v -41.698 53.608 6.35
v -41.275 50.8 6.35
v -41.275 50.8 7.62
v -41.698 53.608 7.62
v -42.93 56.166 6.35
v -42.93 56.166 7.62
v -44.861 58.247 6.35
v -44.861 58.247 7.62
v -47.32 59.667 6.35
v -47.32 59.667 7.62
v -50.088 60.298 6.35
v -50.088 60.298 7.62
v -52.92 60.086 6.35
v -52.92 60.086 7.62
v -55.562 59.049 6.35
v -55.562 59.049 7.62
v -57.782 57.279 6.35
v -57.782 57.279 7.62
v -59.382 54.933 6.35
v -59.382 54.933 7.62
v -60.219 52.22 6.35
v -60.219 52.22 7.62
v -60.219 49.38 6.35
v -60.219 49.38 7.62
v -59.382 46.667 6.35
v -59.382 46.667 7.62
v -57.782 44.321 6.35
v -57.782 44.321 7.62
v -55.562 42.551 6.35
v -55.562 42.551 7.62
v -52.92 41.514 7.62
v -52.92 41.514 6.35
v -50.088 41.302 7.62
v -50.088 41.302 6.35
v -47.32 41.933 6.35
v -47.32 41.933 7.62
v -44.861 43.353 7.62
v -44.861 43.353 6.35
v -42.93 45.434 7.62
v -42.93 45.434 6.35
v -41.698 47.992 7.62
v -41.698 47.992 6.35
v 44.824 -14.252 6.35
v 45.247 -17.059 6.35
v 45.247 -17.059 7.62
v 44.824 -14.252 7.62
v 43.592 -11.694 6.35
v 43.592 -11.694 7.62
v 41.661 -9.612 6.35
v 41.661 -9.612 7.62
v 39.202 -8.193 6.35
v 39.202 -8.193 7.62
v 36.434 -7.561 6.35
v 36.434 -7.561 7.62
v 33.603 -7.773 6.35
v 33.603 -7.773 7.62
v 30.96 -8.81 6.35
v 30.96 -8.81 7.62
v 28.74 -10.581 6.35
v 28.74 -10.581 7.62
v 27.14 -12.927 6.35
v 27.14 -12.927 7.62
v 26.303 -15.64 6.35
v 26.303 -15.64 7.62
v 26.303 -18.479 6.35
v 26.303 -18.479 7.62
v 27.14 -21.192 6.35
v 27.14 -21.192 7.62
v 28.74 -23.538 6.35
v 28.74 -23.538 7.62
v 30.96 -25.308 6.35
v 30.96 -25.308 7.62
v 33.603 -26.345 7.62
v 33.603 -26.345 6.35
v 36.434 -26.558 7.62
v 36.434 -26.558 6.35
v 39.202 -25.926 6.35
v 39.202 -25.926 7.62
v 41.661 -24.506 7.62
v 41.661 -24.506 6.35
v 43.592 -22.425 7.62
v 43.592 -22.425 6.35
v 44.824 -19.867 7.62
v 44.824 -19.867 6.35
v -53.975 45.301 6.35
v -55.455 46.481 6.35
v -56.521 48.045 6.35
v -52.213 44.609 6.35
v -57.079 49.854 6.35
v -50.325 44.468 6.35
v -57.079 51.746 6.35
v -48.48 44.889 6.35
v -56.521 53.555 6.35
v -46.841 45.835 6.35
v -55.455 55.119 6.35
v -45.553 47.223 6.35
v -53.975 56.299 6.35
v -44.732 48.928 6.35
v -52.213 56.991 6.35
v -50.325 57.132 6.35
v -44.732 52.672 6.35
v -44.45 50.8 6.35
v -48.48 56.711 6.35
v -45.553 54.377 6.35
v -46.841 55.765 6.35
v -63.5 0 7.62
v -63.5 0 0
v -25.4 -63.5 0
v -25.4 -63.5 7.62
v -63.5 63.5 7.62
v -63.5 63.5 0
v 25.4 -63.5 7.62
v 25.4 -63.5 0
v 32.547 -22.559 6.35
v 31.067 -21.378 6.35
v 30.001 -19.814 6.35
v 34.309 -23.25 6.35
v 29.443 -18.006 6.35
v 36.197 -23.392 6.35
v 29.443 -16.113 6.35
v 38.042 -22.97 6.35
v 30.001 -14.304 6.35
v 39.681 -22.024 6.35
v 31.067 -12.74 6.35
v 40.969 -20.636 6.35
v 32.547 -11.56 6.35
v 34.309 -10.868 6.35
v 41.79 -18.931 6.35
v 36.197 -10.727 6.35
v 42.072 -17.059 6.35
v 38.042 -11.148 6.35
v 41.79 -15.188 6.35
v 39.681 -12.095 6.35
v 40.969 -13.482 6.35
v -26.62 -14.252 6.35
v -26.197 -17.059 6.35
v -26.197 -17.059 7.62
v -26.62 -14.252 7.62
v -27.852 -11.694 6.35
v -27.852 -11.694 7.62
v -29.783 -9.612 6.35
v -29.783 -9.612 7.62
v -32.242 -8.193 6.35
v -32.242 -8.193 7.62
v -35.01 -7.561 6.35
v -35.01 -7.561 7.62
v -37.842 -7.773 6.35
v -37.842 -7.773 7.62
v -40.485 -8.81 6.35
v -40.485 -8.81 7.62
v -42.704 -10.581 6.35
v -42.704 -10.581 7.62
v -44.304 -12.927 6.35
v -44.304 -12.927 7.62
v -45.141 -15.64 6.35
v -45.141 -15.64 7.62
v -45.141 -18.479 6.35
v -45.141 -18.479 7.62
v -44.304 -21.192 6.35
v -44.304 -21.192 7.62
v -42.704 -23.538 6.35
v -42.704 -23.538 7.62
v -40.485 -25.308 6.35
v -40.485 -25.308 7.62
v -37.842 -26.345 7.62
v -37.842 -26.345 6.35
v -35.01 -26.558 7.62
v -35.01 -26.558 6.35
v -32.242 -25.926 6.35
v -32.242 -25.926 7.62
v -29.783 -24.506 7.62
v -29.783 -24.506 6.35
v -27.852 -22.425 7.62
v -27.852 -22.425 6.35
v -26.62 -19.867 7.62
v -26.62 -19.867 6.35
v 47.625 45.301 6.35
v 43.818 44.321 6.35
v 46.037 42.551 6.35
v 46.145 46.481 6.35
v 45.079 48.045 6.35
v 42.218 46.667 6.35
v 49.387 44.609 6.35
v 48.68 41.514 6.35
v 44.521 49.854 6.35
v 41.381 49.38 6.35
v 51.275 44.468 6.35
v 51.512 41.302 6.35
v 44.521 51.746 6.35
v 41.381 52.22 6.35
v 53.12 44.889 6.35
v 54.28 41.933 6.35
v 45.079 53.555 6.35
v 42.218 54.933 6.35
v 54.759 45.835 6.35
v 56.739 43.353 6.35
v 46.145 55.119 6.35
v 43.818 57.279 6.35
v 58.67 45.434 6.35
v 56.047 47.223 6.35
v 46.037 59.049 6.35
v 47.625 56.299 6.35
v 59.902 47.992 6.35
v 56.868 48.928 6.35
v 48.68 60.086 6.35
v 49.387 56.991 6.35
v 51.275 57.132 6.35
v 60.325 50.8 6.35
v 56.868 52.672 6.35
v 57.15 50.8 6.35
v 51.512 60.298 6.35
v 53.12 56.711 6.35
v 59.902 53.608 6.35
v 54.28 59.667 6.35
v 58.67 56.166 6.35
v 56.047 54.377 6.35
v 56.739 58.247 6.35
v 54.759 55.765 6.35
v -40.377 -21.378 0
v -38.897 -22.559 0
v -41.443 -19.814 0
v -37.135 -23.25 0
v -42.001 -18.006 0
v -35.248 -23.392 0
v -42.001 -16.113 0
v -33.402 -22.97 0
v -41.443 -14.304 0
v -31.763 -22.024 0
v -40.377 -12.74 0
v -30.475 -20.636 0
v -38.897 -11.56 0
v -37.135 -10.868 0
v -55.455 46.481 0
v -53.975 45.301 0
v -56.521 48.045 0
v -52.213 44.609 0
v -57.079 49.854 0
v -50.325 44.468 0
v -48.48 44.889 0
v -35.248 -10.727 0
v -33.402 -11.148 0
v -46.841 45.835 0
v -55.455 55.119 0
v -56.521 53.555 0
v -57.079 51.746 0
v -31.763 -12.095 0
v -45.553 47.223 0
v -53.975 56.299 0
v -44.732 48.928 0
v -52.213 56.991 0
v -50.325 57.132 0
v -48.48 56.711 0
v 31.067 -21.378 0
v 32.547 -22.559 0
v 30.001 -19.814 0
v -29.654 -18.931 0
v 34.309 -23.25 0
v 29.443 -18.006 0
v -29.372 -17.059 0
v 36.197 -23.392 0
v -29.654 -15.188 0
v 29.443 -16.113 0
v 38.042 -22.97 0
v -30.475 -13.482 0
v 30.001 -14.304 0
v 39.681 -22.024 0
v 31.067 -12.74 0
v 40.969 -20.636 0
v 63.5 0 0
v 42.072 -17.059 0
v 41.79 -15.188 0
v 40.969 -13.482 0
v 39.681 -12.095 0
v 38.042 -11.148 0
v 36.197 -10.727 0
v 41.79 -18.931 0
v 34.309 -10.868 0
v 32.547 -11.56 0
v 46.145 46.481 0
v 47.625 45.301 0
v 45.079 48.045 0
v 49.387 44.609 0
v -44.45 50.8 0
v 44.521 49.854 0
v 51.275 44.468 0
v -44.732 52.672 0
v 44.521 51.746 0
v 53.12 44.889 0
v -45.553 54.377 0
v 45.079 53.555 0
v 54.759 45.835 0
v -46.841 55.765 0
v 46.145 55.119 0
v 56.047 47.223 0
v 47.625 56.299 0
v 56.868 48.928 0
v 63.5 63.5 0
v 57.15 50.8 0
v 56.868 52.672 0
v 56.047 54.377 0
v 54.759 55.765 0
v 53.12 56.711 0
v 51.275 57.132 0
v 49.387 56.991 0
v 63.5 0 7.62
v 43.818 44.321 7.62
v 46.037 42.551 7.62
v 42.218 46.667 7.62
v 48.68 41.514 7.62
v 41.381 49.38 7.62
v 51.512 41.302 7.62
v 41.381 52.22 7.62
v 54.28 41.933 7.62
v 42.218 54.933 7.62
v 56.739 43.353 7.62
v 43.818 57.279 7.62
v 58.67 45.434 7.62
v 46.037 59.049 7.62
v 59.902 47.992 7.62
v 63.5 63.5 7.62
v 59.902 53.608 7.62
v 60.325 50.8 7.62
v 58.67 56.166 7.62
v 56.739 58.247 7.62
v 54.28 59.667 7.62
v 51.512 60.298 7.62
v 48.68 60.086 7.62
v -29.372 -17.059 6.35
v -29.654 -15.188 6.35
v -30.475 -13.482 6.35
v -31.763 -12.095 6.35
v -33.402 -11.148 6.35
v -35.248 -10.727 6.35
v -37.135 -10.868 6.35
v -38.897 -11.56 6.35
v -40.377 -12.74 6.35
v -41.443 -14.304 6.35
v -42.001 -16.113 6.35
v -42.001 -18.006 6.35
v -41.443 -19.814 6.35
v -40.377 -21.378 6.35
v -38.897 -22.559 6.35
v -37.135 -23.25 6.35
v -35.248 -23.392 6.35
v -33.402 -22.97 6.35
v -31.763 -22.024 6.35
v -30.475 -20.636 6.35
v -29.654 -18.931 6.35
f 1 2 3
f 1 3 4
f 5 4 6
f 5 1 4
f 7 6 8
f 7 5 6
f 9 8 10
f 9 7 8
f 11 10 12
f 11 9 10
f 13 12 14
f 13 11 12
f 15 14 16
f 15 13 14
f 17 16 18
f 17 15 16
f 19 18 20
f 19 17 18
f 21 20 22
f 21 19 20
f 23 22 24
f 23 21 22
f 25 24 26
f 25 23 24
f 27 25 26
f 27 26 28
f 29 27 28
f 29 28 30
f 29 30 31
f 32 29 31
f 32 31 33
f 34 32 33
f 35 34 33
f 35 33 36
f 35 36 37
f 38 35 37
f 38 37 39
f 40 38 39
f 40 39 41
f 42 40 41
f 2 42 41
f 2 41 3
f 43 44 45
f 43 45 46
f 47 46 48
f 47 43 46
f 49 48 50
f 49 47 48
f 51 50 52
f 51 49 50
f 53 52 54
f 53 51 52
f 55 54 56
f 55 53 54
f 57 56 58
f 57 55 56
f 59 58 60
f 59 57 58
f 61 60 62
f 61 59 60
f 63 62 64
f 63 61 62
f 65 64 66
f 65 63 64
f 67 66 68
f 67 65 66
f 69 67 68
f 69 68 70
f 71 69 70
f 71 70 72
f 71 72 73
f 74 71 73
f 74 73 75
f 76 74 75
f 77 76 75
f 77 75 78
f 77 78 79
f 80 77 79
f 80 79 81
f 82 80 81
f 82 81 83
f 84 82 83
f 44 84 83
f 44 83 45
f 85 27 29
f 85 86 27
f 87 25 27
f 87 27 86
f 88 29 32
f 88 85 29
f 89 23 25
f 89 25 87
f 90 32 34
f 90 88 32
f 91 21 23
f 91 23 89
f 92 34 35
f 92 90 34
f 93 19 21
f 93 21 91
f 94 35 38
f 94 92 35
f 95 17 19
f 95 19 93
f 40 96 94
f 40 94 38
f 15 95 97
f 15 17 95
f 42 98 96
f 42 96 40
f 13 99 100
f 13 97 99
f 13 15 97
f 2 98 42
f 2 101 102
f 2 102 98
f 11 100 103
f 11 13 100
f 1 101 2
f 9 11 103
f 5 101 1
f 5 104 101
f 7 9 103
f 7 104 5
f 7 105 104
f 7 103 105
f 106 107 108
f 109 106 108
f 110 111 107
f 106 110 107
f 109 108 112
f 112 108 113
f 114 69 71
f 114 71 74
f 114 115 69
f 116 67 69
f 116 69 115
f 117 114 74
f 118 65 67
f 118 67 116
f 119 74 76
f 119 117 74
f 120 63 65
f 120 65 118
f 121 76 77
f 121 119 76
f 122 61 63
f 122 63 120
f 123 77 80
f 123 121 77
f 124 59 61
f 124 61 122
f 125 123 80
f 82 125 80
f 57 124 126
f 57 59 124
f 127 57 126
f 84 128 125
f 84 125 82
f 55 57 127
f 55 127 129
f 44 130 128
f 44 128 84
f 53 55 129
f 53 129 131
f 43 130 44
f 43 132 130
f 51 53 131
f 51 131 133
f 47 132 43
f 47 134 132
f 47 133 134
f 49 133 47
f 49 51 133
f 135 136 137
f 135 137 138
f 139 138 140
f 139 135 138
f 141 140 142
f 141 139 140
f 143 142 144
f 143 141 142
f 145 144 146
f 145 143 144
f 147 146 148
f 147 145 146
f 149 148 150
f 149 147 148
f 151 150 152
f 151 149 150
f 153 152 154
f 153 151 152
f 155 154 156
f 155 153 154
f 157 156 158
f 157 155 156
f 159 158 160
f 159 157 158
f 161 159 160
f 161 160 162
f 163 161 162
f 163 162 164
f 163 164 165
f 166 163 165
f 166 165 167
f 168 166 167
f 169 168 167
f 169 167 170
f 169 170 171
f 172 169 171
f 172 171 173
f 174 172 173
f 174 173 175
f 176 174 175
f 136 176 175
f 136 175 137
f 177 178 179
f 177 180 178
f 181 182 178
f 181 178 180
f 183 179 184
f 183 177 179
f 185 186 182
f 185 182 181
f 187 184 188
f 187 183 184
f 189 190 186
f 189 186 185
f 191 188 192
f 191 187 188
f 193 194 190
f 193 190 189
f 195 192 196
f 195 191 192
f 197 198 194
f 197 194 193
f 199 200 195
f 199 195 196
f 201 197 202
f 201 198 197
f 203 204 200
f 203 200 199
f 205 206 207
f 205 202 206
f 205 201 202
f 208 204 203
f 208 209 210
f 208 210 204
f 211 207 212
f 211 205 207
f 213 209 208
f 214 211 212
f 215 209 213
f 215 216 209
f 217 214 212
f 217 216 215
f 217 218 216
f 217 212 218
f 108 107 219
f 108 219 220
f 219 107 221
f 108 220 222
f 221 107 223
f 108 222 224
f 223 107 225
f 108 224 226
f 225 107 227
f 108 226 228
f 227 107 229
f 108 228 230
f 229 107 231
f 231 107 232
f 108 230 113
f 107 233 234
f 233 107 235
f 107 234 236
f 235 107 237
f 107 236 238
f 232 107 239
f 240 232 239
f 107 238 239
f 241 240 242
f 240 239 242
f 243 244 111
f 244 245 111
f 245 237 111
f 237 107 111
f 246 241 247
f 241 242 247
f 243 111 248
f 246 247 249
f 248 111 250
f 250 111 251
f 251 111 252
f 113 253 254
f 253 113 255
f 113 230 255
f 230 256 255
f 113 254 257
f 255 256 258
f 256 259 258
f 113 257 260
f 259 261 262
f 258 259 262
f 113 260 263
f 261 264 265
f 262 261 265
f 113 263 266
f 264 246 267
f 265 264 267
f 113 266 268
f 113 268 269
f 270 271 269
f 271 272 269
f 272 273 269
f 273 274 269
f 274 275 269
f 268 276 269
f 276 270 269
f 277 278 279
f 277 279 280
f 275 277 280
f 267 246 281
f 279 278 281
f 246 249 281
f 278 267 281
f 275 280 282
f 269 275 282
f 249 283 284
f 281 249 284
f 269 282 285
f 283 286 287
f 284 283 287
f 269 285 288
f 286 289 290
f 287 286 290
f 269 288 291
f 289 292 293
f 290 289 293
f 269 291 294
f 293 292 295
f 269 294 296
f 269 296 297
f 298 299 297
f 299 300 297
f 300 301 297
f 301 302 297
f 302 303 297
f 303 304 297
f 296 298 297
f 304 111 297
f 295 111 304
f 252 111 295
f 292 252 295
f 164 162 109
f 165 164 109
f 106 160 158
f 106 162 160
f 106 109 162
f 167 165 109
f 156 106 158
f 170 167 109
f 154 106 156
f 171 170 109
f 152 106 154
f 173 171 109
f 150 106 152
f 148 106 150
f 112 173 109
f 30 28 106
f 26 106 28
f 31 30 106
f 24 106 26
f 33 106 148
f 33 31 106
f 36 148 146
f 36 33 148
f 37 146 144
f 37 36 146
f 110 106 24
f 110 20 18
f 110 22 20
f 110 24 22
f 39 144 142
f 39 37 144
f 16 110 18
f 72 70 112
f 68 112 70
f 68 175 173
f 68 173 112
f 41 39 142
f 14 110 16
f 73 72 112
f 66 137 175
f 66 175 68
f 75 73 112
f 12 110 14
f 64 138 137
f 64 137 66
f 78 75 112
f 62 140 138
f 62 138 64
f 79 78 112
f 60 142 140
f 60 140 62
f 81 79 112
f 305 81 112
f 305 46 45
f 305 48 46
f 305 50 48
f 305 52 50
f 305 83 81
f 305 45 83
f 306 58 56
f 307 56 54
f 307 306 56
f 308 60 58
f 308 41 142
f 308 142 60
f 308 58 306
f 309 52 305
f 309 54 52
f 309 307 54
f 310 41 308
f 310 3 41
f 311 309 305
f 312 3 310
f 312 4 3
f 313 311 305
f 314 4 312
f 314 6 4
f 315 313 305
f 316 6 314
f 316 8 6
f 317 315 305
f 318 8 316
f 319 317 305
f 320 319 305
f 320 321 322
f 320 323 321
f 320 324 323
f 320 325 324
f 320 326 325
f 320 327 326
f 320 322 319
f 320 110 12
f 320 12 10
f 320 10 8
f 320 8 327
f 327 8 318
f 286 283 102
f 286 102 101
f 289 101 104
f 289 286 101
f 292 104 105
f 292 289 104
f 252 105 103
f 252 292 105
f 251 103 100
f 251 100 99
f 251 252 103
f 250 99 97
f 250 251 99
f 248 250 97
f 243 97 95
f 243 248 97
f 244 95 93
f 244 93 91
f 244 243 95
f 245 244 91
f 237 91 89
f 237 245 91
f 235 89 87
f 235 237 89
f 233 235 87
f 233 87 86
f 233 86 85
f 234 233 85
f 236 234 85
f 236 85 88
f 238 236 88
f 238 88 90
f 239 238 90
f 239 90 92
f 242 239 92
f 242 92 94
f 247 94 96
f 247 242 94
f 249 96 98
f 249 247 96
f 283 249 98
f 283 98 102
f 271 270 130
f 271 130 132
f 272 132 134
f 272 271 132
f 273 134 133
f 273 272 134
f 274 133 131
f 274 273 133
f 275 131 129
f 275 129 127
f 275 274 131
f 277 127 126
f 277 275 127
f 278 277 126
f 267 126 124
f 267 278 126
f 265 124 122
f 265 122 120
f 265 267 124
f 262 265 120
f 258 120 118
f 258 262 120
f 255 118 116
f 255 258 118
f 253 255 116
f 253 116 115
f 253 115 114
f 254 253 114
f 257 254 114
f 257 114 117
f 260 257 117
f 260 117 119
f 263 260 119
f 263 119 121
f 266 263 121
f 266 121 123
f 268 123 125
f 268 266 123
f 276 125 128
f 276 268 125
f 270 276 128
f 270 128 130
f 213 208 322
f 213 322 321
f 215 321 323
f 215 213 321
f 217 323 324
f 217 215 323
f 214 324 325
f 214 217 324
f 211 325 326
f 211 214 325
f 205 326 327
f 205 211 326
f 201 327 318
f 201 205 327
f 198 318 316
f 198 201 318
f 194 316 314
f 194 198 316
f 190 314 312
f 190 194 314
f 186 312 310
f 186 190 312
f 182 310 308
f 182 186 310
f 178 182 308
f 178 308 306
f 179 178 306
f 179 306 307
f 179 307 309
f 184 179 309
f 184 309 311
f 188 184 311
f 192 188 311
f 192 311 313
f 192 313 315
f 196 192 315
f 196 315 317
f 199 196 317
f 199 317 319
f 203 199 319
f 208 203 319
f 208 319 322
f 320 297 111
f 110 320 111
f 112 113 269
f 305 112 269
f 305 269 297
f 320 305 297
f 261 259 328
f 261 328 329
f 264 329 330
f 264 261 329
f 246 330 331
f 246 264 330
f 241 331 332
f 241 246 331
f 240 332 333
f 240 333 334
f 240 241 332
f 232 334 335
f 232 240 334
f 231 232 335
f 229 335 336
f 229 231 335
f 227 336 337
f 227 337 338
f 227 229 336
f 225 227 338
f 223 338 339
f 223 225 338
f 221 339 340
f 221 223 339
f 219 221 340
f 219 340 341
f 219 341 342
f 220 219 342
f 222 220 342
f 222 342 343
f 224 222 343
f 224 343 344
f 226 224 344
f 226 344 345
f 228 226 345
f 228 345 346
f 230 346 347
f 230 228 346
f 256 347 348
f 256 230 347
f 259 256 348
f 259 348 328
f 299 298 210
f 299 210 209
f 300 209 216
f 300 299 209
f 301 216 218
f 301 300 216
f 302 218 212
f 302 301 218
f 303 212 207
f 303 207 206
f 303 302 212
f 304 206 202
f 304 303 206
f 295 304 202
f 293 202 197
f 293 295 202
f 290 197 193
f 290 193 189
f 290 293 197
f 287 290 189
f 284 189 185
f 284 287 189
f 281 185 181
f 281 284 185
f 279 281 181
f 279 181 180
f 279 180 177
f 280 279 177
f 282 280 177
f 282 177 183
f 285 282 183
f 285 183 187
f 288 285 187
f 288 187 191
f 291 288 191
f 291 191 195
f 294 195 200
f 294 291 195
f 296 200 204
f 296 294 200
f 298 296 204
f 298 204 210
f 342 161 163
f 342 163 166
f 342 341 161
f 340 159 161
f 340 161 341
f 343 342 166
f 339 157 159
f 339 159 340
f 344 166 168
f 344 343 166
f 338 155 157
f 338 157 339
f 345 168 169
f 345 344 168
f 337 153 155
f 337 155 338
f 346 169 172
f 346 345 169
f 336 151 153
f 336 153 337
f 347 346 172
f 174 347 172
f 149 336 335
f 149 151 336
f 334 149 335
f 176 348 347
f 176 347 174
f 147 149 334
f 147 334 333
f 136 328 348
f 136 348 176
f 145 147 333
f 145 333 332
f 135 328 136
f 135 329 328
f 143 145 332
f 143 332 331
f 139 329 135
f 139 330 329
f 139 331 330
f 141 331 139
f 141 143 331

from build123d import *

# Parameters (mm, degrees)
F0_R     = 9.525
F2_DEPTH = 7.62
F0_R_2   = 6.35
F3_DEPTH = 6.35


with BuildPart() as f2:
    # F0 (on Top) → F2 (new body)
    with BuildSketch(Plane.XY):
        Polygon((-63.5, 0), (-25.4, -63.5), (25.4, -63.5), (63.5, 0), (63.5, 63.5), (-63.5, 63.5), align=None)
        with Locations((-35.722047, -17.059289)):
            Circle(F0_R, mode=Mode.SUBTRACT)
        with Locations((35.722047, -17.059289)):
            Circle(F0_R, mode=Mode.SUBTRACT)
        with Locations((-50.8, 50.8)):
            Circle(F0_R, mode=Mode.SUBTRACT)
        with Locations((50.8, 50.8)):
            Circle(F0_R, mode=Mode.SUBTRACT)
    extrude(amount=F2_DEPTH)

    # F0 (on Top) → F3 (join)
    with BuildSketch(Plane.XY):
        with Locations((-50.8, 50.8)):
            Circle(F0_R)
        with Locations((-50.8, 50.8)):
            Circle(F0_R_2, mode=Mode.SUBTRACT)
        with Locations((50.8, 50.8)):
            Circle(F0_R)
        with Locations((50.8, 50.8)):
            Circle(F0_R_2, mode=Mode.SUBTRACT)
        with Locations((35.722047, -17.059289)):
            Circle(F0_R)
        with Locations((35.722047, -17.059289)):
            Circle(F0_R_2, mode=Mode.SUBTRACT)
        with Locations((-35.722047, -17.059289)):
            Circle(F0_R)
        with Locations((-35.722047, -17.059289)):
            Circle(F0_R_2, mode=Mode.SUBTRACT)
    extrude(amount=F3_DEPTH)


solid = f2.part
